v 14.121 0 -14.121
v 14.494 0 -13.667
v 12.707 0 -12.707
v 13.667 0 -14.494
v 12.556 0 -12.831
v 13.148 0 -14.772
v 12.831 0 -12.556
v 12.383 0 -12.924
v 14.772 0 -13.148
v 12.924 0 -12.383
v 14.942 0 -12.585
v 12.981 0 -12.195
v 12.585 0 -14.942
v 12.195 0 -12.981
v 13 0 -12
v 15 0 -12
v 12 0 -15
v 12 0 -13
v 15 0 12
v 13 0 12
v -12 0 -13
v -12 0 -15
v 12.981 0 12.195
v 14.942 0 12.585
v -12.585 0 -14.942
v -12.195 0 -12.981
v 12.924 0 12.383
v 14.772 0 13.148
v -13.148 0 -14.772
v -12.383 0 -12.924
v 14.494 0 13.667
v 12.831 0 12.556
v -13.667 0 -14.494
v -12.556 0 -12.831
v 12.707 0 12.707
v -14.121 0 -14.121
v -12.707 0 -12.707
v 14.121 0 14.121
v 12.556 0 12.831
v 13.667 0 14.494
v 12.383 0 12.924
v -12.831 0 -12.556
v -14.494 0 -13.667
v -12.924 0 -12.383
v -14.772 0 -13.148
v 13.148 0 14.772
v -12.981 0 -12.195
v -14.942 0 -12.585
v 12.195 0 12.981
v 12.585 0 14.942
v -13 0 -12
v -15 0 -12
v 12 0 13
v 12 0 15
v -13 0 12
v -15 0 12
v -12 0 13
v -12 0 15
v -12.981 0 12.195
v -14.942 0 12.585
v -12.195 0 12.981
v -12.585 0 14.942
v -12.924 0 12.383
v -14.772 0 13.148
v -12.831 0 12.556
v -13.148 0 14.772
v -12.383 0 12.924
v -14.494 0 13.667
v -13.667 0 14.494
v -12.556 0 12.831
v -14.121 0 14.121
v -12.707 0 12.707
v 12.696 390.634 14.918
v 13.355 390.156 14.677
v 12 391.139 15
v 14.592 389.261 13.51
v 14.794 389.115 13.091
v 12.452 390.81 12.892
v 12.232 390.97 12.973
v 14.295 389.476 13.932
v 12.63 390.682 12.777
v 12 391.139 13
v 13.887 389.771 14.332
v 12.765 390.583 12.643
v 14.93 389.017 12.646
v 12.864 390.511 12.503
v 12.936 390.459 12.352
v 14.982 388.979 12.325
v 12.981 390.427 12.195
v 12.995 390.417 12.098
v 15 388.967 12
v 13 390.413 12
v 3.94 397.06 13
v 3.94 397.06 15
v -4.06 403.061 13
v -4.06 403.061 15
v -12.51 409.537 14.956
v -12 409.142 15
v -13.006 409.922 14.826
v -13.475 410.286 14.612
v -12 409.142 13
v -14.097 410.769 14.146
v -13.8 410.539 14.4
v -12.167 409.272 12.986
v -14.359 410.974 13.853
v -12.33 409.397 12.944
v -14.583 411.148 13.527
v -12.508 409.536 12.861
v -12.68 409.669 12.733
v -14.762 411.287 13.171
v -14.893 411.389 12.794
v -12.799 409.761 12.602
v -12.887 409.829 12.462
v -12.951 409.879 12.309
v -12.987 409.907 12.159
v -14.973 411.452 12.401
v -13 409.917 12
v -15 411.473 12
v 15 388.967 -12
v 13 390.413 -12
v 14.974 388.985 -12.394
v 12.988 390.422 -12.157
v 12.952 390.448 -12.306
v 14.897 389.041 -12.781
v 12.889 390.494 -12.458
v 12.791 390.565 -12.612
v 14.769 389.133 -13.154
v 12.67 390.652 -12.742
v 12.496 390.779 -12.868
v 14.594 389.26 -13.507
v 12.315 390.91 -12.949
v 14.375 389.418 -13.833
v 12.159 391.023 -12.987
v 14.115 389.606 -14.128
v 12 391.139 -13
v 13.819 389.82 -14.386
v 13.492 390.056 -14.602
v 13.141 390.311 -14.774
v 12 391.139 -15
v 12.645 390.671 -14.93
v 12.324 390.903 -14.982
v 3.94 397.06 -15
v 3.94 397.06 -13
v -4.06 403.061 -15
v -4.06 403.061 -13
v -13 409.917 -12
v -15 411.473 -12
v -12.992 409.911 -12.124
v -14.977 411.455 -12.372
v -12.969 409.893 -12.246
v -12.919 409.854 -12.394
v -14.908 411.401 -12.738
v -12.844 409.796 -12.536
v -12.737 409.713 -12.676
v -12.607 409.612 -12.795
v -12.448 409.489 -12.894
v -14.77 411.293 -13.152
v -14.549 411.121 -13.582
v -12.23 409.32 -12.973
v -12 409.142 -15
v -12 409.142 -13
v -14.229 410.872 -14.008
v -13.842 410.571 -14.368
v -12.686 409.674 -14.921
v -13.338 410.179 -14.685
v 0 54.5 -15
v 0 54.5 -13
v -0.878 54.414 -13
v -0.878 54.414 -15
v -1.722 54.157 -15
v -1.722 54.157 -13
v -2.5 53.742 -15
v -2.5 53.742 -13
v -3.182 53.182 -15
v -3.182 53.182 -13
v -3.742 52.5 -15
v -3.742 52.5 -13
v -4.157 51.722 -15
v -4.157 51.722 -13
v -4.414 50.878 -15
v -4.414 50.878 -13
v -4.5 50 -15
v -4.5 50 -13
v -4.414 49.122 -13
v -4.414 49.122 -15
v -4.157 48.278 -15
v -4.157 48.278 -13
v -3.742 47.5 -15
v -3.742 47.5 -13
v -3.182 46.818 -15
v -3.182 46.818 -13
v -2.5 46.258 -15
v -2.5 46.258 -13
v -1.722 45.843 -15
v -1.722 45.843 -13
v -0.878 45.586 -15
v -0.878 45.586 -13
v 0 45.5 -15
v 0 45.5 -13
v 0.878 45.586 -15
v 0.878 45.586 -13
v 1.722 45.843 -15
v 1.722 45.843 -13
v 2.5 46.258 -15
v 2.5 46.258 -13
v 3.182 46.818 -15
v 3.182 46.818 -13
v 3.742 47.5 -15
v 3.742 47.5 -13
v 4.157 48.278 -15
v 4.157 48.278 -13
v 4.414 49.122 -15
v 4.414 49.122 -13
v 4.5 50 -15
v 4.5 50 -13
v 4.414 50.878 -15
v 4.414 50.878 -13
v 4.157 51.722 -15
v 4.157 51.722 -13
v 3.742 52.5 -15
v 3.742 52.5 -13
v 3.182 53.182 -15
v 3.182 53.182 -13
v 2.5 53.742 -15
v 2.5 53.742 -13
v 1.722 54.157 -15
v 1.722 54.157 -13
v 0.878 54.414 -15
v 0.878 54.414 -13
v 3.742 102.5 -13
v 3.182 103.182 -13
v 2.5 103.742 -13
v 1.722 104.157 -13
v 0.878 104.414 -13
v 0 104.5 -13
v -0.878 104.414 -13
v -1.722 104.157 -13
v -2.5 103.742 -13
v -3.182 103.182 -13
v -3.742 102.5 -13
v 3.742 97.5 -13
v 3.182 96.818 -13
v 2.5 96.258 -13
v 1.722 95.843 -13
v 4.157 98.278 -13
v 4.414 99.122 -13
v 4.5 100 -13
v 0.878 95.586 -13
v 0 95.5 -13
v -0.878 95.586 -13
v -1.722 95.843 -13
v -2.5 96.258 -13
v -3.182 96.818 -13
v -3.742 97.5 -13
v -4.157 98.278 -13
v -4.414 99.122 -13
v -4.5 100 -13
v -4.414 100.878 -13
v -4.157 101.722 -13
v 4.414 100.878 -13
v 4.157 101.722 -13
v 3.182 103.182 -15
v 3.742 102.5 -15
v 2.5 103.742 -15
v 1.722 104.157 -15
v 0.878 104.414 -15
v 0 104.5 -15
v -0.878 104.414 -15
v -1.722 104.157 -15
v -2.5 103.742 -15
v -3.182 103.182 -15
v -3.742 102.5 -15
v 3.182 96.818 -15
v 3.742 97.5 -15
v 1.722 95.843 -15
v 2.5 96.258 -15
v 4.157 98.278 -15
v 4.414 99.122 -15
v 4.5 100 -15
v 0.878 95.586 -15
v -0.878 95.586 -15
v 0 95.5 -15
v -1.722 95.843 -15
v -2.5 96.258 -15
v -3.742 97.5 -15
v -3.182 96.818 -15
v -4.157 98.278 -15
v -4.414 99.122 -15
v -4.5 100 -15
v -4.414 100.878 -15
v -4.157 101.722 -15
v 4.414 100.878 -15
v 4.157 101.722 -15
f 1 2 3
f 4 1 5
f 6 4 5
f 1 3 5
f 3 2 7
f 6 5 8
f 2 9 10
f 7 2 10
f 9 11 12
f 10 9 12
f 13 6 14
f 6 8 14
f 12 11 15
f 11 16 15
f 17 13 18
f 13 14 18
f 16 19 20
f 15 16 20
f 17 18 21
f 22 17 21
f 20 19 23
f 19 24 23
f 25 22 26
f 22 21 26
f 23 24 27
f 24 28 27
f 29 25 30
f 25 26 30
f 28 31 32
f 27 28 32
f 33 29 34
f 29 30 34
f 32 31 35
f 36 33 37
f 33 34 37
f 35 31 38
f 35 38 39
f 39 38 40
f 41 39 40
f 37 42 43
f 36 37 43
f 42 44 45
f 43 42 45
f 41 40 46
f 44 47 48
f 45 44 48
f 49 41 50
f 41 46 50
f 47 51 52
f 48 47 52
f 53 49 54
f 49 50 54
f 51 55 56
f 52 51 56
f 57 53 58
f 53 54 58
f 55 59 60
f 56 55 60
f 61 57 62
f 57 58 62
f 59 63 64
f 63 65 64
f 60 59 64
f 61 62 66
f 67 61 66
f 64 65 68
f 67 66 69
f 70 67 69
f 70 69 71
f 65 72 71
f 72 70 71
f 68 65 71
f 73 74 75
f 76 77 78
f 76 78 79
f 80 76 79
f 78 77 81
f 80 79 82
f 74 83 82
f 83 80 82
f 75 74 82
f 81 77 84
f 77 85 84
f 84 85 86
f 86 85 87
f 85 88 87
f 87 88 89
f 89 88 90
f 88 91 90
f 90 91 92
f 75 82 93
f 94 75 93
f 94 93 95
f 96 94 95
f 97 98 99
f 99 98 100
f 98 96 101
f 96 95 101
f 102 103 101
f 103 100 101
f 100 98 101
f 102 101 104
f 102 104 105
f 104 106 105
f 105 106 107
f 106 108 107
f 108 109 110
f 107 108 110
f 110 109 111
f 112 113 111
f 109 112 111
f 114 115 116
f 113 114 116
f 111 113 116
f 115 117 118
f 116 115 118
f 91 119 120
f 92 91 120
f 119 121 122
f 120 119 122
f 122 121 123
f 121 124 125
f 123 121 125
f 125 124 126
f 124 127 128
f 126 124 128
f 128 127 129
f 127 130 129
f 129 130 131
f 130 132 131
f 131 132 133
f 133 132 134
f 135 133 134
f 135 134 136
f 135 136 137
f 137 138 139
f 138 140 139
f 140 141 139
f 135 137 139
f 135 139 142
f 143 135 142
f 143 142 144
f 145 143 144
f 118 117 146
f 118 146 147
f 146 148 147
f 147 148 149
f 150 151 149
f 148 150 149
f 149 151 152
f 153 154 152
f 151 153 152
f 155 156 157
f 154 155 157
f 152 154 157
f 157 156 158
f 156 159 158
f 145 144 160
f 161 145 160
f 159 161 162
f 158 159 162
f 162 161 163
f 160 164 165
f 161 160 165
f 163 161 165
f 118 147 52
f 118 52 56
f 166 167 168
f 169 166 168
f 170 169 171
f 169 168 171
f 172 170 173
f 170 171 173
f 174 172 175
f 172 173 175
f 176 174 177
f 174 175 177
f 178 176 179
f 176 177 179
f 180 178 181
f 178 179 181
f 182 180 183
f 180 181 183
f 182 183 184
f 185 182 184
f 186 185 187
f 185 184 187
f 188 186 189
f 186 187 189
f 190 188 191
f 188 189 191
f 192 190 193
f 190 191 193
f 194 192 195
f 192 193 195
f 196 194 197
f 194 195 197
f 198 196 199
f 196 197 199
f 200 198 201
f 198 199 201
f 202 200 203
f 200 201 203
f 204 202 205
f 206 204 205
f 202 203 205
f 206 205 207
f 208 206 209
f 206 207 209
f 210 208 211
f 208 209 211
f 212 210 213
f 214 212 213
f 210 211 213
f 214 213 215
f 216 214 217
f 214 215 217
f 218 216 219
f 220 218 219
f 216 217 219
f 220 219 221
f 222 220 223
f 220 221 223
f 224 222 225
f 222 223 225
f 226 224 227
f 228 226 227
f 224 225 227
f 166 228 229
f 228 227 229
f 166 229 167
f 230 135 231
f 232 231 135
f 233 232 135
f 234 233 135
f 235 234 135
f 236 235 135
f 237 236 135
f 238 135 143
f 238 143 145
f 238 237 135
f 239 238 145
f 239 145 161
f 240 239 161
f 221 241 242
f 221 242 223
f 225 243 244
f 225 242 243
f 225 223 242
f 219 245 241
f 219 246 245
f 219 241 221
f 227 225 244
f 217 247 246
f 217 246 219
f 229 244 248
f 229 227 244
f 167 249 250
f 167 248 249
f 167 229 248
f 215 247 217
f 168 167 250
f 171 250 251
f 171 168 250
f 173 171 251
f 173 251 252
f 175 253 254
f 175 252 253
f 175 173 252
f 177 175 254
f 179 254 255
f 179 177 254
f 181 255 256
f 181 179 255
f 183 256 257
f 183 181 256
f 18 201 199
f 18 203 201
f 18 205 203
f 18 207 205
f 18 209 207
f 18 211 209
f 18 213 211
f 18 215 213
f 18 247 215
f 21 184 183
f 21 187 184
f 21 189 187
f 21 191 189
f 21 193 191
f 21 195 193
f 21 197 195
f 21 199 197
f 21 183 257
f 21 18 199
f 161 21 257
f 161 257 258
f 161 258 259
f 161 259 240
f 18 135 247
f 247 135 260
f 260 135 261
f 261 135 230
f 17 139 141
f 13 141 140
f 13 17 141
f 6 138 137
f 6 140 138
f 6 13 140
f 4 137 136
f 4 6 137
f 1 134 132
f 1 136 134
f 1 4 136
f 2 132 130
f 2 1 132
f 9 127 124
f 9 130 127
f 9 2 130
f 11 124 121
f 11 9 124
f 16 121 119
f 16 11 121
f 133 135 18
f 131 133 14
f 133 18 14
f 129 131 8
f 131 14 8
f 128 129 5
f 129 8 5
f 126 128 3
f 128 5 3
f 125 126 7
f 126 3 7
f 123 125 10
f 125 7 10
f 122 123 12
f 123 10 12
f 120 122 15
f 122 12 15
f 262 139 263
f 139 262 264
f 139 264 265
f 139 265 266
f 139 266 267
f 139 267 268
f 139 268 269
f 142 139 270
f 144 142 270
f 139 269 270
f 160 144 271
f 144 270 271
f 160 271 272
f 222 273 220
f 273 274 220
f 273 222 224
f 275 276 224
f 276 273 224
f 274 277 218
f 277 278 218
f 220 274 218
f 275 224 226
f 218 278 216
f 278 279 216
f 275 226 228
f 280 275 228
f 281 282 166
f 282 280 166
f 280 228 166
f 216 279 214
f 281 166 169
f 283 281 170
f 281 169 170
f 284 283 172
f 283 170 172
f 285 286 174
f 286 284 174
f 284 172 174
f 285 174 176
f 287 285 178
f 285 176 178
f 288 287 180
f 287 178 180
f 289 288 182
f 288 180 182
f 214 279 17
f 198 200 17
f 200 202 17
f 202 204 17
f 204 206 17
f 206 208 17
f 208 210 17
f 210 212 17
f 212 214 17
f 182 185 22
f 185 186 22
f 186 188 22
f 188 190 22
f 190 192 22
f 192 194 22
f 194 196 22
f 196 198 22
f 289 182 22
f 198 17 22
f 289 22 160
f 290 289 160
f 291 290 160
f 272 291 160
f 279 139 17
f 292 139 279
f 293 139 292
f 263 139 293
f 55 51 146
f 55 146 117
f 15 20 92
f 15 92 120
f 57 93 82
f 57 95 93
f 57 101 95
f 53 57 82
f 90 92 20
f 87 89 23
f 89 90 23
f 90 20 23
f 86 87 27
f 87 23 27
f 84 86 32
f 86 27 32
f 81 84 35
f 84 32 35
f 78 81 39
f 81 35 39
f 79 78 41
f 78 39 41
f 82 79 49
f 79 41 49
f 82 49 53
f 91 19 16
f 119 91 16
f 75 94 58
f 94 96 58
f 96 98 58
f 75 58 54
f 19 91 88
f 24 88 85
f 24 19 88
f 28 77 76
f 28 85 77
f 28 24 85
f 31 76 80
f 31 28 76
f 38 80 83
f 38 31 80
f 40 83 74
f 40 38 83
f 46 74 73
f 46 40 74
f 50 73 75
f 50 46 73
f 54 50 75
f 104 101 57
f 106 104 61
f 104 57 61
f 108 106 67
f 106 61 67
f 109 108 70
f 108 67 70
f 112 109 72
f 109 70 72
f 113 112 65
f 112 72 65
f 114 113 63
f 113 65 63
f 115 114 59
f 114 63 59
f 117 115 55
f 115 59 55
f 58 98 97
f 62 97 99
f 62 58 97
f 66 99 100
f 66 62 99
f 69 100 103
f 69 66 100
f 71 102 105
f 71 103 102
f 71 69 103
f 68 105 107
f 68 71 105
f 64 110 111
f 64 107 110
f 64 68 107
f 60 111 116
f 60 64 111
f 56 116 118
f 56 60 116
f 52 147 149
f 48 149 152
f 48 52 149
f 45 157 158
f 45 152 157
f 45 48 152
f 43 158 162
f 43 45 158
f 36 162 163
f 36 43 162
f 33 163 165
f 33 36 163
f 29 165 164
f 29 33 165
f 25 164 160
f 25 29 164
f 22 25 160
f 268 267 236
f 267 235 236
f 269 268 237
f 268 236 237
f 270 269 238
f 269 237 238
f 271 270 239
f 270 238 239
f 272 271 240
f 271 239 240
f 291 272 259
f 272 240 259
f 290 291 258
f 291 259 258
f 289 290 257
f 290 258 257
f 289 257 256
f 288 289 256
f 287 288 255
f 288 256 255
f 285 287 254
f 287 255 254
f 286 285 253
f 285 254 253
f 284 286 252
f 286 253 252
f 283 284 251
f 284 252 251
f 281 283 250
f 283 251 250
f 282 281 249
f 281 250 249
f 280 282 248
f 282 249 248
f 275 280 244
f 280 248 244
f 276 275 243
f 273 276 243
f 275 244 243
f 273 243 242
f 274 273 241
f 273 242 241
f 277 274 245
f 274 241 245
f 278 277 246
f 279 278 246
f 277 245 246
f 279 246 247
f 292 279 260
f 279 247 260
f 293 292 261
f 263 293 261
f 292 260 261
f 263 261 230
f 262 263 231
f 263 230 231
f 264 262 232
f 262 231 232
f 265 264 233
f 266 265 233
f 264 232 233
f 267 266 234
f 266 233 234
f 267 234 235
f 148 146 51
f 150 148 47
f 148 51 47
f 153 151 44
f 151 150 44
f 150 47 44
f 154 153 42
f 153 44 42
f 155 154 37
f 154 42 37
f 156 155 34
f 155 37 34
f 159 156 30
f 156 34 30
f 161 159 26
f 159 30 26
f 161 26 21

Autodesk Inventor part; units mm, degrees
ref_plane "XZ Plane" through (0, 0, 0) normal (0, 1, 0) x (-1, 0, 0)
sketch "Sketch1" plane through (0, 0, 0) normal (0, 1, 0) x (-1, 0, 0)
  line L0 (-12, 14) -> (12, 14) construction
  line L1 (14, 12) -> (14, -12) construction
  line L2 (12, -14) -> (-12, -14) construction
  line L3 (-14, -12) -> (-14, 12) construction
  line L4 (-14, 14) -> (14, -14) construction
  line L5 (14, 14) -> (-14, -14) construction
  arc A0 (14, 12) -> (12, 14) centre (12, 12) ccw construction
  arc A1 (12, -14) -> (14, -12) centre (12, -12) ccw construction
  arc A2 (-14, -12) -> (-12, -14) centre (-12, -12) ccw construction
  arc A3 (-12, 14) -> (-14, 12) centre (-12, 12) ccw construction
  line L6 (-12, -15) -> (12, -15)
  arc A4 (12, -15) -> (15, -12) centre (12, -12) ccw
  line L7 (15, -12) -> (15, 12)
  arc A5 (15, 12) -> (12, 15) centre (12, 12) ccw
  line L8 (12, 15) -> (-12, 15)
  arc A6 (-12, 15) -> (-15, 12) centre (-12, 12) ccw
  line L9 (-15, 12) -> (-15, -12)
  arc A7 (-15, -12) -> (-12, -15) centre (-12, -12) ccw
  line L10 (13, -12) -> (13, 12)
  arc A8 (13, 12) -> (12, 13) centre (12, 12) ccw
  line L11 (12, 13) -> (-12, 13)
  arc A9 (-12, 13) -> (-13, 12) centre (-12, 12) ccw
  line L12 (-13, 12) -> (-13, -12)
  arc A10 (-13, -12) -> (-12, -13) centre (-12, -12) ccw
  line L13 (-12, -13) -> (12, -13)
  arc A11 (12, -13) -> (13, -12) centre (12, -12) ccw
  point P0 (0, 0)
  point P1 (0, 0)
  point P2 (0, 0)
  dimension "d10" = 2
  dimension "depth" = 30
  dimension "width" = 30
  dimension "thickness" = 2
extrude "Extrusion1" add sketch "Sketch1" along normal blind 500
sketch "Sketch2" plane through (12, 0, -15) normal (0, 0, -1) x (-1, 0, 0)
  line L0 (12, -470) -> (12, 2820) construction
  line L1 (0, 0) -> (24, 0) projected
  point P0 (12, 0)
  point P1 (12, 50)
  point P2 (12, 100)
  dimension "d16" = 50
  dimension "d17" = 50
hole "Hole1" at (0, 50, -15) at (0, 100, -15) direction (0, 0, 1) diameter 9 depth 20.2 tip angle 118
sketch "Sketch3" plane through (12, 0, -15) normal (0, 0, -1) x (-1, 0, 0)
  line L0 (12, -100) -> (12, 600) construction
  circle A0 centre (-588, 1200) radius 1000
  point P0 (12, 0)
  dimension "d29" = 2000
  dimension "d31" = 1200
  dimension "d34" = 600
extrude "Extrusion2" cut sketch "Sketch3" against normal through all
equation "\"d10\" = thickness"
properties part number "noga do okraglej duzej P" material "Steel"
